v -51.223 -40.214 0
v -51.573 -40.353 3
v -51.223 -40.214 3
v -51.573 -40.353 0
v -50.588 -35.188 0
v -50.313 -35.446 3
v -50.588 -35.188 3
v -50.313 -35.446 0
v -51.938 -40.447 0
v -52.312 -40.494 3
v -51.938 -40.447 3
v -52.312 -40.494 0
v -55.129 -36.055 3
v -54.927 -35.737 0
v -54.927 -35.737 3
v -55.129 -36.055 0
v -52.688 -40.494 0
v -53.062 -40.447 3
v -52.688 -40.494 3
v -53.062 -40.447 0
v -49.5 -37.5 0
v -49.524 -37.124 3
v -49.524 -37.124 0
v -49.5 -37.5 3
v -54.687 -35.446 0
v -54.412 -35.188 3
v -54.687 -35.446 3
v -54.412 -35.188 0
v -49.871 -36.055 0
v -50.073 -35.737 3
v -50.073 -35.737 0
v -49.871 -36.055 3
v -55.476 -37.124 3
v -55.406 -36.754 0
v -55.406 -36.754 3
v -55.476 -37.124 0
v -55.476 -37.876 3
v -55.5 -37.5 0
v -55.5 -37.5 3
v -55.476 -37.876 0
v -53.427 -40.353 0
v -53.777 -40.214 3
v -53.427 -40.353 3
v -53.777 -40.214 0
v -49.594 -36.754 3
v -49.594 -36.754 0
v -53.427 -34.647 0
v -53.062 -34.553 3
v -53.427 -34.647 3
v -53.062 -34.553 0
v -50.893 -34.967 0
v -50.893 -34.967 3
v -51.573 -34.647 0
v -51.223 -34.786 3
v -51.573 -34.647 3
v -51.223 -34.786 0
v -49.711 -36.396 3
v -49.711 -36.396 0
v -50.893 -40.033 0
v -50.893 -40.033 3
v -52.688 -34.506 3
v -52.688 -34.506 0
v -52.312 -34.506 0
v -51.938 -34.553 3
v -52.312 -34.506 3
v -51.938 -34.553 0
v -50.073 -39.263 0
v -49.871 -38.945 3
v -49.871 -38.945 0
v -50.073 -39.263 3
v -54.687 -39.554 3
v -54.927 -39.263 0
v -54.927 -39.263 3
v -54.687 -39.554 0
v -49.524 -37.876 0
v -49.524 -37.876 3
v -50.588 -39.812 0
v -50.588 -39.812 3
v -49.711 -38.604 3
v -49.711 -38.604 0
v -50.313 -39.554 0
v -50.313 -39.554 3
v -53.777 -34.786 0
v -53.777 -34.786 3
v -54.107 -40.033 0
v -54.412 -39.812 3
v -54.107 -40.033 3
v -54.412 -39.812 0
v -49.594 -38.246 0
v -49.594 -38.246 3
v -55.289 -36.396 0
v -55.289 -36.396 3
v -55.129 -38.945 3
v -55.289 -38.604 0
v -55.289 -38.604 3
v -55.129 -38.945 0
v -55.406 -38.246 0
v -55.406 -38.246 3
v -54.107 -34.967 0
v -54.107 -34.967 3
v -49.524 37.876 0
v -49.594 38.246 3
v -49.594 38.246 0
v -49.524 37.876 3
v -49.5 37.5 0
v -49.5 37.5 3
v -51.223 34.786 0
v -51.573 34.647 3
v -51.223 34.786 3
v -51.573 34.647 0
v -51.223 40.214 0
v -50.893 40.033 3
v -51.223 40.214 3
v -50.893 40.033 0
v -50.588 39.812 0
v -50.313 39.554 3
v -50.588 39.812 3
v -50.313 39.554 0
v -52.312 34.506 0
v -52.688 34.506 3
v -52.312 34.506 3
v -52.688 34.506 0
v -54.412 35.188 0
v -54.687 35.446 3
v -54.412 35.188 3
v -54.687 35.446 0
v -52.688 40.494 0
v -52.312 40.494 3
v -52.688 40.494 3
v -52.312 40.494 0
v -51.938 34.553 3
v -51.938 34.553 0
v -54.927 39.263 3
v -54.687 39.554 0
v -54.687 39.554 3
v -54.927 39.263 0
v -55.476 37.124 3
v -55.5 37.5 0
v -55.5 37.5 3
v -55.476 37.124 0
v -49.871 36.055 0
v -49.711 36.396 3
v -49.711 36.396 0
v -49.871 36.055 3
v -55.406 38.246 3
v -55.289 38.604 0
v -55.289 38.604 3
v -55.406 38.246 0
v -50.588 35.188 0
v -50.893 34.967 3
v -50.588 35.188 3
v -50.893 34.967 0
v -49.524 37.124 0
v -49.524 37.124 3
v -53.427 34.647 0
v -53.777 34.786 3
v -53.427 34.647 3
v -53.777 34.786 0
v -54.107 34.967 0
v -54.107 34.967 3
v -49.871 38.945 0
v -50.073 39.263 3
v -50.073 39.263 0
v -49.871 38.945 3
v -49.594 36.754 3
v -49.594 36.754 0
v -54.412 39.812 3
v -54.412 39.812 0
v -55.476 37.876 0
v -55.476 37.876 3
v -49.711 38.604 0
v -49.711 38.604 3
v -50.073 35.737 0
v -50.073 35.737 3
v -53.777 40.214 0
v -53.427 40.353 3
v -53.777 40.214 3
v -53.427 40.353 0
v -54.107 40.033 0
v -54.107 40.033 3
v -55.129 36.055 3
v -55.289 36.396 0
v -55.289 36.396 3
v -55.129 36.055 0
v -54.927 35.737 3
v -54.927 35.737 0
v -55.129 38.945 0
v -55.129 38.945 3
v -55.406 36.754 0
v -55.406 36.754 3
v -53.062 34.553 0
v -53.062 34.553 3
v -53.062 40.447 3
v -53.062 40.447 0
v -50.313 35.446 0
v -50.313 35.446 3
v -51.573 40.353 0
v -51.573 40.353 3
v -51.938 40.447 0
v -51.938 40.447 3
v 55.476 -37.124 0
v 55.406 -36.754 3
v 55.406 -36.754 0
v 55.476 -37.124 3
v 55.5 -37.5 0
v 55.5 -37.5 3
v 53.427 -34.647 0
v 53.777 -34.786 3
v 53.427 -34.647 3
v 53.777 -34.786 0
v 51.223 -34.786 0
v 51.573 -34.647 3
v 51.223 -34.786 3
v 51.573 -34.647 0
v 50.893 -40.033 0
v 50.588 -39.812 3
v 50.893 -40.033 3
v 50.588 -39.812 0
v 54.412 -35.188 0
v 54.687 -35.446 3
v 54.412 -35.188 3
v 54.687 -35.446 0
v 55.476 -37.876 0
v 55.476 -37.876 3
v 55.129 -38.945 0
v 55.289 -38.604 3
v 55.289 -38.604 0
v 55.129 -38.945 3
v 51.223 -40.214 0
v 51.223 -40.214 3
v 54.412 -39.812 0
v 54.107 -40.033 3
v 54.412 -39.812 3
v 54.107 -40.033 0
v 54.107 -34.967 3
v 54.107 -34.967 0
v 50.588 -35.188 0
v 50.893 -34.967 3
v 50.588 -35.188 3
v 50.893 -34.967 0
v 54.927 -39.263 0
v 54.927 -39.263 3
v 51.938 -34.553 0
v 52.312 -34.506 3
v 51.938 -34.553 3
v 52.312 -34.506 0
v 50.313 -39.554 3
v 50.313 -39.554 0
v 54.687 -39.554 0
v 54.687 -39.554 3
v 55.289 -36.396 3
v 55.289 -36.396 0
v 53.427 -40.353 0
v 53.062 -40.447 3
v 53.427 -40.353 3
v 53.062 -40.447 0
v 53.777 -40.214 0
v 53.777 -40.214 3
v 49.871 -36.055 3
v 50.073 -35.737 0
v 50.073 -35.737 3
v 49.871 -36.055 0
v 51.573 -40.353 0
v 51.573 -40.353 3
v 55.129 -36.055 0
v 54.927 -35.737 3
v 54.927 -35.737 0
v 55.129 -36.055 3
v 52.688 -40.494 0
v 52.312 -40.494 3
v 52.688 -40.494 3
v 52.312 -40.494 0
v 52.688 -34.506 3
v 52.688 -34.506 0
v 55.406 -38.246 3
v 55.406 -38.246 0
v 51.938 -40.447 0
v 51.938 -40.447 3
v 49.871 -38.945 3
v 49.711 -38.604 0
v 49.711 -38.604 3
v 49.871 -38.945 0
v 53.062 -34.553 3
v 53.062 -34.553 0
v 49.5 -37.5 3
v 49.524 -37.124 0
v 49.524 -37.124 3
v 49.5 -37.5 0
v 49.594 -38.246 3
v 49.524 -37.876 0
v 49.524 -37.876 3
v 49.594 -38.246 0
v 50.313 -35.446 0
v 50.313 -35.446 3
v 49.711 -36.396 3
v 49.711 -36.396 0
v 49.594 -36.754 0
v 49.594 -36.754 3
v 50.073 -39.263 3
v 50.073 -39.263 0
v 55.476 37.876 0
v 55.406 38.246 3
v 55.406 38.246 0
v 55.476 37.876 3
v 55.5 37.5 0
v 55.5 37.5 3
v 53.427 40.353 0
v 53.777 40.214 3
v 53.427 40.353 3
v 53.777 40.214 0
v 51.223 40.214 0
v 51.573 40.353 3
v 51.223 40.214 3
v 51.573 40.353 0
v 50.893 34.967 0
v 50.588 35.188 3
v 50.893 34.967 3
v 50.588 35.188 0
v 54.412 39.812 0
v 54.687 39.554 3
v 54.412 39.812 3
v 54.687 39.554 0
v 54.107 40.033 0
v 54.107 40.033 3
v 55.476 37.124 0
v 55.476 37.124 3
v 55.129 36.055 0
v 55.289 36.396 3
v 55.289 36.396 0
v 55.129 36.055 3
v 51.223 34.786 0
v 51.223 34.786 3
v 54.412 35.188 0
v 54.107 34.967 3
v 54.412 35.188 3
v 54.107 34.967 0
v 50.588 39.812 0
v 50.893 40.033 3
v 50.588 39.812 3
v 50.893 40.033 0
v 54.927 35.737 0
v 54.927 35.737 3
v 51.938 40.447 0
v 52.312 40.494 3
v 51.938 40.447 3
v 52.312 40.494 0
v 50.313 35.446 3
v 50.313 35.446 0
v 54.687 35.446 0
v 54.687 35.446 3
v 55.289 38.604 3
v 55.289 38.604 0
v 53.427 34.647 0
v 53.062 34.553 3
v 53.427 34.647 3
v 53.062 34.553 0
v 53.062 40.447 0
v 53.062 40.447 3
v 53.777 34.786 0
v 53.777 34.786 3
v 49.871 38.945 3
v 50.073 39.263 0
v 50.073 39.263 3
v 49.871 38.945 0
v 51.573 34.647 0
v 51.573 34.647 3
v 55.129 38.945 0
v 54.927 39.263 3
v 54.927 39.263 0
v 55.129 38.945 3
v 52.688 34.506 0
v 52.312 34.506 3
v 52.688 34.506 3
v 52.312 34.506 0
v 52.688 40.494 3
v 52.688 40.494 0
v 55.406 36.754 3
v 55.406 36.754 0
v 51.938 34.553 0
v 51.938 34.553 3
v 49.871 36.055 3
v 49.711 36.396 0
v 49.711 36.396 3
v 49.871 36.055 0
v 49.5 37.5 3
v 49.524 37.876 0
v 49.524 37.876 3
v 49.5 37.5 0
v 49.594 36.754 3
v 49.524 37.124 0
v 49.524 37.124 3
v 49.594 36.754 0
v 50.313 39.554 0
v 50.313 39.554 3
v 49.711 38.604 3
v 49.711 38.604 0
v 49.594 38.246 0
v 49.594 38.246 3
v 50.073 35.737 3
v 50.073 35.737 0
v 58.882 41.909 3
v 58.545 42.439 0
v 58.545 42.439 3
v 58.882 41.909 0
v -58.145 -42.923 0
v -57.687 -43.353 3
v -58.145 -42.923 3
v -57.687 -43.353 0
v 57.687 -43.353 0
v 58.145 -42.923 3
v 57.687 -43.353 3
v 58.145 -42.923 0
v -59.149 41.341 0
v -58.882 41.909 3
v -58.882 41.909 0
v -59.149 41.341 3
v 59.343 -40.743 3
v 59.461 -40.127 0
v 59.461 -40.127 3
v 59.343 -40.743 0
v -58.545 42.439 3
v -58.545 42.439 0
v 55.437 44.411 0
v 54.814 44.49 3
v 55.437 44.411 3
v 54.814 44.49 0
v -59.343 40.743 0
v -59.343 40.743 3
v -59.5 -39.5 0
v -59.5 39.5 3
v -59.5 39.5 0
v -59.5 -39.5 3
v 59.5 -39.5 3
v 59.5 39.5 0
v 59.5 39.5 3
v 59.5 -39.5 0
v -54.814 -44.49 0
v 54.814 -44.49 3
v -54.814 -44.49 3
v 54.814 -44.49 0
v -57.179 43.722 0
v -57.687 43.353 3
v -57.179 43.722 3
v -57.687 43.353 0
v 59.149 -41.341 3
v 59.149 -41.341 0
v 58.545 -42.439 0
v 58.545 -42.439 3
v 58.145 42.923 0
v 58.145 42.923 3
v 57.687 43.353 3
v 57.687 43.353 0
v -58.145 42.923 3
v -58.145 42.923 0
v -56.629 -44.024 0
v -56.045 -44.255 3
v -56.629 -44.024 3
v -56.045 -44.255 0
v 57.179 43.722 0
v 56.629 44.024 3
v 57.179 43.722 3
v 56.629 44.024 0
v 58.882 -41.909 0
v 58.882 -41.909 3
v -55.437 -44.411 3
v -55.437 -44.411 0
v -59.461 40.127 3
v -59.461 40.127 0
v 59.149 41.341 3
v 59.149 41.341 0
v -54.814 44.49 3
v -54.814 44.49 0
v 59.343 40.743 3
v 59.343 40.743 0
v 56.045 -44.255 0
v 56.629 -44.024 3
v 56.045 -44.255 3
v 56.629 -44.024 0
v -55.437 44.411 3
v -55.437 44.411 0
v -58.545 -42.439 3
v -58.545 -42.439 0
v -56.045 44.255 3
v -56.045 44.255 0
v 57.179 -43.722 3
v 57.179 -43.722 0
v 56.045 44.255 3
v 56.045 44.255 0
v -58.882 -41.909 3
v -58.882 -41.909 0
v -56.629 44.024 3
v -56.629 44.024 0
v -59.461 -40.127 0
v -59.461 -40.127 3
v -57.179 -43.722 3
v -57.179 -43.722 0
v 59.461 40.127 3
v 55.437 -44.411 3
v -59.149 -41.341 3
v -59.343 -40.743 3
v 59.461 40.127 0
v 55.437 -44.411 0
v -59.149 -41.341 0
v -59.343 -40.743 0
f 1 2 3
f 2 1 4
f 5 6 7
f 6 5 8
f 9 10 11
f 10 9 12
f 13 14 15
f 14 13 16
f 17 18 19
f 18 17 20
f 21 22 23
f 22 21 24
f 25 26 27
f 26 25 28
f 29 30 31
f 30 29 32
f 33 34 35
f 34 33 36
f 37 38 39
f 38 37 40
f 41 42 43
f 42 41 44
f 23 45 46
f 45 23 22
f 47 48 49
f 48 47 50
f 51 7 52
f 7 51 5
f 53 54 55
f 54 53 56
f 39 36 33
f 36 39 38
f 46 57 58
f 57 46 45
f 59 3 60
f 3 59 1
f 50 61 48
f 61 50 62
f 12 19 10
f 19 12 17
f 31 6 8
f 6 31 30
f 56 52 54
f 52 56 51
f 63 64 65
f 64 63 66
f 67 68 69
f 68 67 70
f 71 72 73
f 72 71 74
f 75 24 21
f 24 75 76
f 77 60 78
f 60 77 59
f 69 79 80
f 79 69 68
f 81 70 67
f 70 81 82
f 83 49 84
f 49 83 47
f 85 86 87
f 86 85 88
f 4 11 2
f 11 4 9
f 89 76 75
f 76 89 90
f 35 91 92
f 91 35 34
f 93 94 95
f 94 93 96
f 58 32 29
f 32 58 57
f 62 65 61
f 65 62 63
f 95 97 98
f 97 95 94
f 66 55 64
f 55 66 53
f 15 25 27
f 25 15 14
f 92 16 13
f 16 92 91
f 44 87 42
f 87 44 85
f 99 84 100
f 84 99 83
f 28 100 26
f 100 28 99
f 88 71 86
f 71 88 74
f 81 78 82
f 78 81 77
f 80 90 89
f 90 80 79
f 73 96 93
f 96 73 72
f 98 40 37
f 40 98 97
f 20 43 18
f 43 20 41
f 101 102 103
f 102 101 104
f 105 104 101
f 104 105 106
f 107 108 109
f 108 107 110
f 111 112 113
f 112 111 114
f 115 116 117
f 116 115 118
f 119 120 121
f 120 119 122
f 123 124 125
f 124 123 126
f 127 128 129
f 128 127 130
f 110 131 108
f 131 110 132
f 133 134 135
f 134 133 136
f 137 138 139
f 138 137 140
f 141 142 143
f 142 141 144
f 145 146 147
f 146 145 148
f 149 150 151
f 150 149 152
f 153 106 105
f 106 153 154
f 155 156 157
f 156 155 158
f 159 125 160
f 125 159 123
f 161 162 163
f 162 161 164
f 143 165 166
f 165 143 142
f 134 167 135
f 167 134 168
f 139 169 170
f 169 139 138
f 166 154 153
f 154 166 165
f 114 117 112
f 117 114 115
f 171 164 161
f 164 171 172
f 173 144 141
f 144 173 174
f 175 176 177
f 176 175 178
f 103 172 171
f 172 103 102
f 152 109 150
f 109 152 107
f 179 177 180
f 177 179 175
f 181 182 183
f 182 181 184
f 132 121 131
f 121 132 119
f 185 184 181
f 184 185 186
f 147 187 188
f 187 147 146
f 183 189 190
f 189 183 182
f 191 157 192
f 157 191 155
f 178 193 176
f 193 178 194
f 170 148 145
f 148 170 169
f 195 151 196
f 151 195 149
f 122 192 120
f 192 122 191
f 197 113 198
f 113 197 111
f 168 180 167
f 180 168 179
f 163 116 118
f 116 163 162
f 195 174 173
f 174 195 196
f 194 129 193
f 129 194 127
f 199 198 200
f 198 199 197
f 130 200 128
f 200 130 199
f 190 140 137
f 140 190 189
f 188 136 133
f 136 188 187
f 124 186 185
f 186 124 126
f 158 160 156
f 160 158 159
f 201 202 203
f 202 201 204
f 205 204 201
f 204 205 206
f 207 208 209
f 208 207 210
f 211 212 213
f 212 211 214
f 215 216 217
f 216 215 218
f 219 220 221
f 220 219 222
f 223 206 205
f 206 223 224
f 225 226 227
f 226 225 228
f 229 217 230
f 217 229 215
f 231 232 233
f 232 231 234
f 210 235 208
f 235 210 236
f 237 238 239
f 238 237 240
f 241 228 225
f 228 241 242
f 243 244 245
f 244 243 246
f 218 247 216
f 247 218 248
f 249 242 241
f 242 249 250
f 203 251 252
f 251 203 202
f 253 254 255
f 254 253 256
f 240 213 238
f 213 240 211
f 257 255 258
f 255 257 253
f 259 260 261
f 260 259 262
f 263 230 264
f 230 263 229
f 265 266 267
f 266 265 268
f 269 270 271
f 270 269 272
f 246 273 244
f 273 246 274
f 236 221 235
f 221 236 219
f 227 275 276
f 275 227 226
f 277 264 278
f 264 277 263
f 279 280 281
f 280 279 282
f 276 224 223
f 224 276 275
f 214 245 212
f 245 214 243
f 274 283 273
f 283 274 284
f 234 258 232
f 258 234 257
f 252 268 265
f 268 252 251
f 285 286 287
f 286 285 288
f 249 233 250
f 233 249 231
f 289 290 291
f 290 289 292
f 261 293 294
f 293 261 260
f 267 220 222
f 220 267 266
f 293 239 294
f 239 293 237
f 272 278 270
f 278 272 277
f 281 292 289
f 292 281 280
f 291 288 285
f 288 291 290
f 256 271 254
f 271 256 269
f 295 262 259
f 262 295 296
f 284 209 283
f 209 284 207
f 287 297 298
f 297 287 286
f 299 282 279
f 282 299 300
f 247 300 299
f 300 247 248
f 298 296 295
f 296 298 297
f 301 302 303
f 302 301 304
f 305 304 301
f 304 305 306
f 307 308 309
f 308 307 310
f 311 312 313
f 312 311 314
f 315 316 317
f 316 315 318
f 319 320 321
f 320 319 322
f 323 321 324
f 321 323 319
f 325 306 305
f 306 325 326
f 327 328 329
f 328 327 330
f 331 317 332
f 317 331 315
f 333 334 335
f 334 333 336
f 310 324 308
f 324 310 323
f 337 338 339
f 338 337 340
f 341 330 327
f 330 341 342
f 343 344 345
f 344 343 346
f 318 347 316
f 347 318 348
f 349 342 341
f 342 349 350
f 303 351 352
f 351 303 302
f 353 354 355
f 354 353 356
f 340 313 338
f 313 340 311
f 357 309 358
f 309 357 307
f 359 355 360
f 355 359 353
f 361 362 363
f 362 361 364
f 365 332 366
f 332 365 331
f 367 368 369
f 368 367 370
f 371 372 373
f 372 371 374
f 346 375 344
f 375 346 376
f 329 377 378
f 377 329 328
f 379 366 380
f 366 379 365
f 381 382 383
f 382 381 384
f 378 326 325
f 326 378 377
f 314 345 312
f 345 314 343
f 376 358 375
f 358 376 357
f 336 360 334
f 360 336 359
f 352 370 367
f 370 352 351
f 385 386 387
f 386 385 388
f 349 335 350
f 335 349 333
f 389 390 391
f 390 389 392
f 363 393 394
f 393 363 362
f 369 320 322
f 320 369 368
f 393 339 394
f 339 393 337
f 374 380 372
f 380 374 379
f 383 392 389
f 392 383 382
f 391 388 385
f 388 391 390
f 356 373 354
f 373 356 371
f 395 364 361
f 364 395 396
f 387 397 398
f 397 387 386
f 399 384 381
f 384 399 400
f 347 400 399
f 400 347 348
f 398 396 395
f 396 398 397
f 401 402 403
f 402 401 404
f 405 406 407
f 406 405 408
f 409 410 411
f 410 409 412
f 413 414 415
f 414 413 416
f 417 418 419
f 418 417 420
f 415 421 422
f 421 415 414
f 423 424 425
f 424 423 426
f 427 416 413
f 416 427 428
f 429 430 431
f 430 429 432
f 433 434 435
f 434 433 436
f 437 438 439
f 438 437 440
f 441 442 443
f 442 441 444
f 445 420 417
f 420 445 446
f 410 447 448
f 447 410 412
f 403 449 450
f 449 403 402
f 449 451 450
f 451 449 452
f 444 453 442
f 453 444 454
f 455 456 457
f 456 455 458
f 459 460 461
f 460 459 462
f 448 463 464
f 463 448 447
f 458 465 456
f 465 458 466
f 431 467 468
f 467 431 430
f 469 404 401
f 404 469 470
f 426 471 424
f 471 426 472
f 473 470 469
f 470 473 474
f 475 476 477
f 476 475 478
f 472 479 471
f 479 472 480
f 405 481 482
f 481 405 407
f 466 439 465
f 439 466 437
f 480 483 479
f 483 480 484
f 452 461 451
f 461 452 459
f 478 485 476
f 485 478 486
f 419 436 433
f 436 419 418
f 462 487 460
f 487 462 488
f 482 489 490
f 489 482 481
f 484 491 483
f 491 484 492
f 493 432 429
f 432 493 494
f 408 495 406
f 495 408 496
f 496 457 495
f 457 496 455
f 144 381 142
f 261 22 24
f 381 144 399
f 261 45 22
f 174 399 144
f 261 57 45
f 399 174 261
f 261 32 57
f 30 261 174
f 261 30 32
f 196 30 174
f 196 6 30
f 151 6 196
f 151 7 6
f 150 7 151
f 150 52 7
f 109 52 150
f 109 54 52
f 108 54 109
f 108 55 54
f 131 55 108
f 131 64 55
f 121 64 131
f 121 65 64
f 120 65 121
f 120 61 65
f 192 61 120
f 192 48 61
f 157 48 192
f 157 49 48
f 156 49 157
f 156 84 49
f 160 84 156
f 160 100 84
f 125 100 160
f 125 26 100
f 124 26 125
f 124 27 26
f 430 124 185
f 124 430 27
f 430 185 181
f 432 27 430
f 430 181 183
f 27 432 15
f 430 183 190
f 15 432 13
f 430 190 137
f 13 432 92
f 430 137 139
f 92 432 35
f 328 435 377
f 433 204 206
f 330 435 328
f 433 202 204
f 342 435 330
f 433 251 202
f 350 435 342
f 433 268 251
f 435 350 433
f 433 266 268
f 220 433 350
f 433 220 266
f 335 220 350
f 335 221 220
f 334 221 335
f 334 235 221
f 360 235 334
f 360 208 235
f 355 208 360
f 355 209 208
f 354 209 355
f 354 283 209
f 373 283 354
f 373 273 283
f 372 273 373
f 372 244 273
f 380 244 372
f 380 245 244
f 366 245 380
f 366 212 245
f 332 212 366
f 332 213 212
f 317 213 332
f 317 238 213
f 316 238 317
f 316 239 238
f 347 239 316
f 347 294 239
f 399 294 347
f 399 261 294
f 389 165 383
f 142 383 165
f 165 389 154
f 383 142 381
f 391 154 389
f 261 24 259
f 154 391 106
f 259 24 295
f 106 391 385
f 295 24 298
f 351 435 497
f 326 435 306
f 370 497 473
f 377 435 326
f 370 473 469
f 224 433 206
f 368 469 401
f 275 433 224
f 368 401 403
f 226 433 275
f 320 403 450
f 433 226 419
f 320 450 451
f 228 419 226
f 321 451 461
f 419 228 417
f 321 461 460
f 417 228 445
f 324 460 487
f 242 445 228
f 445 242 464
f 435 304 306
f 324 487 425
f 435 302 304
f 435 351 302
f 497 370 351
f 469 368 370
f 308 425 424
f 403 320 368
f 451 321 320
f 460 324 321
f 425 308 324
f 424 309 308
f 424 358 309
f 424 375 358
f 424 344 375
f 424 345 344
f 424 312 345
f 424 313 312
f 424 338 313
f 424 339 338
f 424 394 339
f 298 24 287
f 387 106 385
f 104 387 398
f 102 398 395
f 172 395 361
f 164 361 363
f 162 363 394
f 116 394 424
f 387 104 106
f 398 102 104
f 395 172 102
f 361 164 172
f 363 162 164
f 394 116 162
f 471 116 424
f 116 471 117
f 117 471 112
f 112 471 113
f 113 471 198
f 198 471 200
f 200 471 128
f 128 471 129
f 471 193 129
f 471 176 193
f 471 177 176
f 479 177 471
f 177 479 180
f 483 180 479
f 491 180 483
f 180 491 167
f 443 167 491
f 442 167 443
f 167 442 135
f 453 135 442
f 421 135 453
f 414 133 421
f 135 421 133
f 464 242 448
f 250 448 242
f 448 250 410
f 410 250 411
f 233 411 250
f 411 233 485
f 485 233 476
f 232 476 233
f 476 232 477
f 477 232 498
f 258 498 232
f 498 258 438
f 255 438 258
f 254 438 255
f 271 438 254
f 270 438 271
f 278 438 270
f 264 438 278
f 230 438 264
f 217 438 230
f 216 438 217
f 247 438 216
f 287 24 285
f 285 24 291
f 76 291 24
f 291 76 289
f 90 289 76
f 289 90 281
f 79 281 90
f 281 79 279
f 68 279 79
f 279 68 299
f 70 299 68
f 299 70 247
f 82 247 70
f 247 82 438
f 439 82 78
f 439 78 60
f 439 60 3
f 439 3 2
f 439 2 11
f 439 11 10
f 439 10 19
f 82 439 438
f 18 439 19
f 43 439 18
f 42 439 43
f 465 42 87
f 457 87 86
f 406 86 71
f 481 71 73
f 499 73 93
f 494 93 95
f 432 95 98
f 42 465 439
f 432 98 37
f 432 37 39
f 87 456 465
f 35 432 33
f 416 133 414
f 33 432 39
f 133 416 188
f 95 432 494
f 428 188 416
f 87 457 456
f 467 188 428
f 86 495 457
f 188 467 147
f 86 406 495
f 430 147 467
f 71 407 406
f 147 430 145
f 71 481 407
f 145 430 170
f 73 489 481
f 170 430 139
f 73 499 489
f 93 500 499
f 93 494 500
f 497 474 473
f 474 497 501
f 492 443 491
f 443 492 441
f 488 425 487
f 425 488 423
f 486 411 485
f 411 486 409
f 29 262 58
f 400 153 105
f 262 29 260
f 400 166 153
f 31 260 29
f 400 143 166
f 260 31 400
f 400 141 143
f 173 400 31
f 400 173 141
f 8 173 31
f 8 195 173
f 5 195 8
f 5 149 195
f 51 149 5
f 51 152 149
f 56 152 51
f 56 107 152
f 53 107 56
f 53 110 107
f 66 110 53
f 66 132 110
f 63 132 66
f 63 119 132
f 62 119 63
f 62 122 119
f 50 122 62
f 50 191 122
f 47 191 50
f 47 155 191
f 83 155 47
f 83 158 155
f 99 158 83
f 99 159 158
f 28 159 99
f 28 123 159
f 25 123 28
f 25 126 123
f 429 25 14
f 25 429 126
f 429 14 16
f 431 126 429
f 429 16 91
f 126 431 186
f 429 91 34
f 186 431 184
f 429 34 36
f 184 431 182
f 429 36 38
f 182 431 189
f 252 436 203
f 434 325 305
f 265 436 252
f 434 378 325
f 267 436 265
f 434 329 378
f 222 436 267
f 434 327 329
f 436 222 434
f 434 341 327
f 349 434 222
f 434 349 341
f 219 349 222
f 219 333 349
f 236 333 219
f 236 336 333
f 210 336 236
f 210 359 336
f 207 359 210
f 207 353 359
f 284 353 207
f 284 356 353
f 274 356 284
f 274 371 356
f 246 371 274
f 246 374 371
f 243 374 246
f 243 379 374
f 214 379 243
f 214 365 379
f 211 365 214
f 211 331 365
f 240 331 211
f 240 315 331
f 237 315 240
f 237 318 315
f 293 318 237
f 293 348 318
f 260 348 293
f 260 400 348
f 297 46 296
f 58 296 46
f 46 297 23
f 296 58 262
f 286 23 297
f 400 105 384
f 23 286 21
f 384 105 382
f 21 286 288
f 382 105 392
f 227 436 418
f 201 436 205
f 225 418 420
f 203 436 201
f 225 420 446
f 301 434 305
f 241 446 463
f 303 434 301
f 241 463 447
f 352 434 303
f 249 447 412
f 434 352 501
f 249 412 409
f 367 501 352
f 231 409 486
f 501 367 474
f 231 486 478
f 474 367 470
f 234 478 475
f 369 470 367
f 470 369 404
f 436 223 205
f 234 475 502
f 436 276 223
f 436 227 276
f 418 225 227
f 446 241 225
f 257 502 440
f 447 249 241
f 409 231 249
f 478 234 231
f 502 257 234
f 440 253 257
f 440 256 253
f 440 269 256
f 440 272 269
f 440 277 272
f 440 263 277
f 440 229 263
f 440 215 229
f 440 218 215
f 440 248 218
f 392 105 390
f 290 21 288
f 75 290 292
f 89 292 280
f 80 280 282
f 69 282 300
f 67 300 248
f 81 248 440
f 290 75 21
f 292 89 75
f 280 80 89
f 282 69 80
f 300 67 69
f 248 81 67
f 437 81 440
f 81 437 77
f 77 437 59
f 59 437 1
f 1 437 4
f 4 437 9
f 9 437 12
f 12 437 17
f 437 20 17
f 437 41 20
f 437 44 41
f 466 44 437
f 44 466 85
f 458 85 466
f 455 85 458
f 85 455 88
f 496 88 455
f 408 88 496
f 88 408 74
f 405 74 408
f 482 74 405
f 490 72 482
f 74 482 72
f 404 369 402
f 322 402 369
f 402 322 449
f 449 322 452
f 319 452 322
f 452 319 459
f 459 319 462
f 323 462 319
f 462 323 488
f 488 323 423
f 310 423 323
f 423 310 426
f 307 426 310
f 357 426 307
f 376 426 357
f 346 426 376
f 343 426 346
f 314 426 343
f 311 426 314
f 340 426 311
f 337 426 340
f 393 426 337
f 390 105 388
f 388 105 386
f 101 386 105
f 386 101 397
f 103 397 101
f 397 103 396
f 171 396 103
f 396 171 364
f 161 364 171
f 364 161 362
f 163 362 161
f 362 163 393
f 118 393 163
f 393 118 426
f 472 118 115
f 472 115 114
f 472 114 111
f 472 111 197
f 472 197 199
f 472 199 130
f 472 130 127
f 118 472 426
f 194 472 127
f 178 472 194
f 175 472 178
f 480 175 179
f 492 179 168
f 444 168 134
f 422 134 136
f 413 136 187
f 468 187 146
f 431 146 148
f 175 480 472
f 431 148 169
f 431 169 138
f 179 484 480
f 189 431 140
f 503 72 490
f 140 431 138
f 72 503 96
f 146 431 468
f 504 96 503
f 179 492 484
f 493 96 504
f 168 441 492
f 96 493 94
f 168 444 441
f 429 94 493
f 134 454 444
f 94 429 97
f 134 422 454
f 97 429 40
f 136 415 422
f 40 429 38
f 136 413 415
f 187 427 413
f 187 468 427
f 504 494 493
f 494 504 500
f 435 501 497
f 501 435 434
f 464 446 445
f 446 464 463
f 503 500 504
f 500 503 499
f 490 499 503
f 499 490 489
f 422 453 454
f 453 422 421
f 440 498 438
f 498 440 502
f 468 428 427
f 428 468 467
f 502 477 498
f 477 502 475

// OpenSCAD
$fn = 50;


difference() {
	union() {
		hull() {
			translate(v = [-54.5000000000, 39.5000000000, 0]) {
				cylinder(h = 3, r = 5);
			}
			translate(v = [54.5000000000, 39.5000000000, 0]) {
				cylinder(h = 3, r = 5);
			}
			translate(v = [-54.5000000000, -39.5000000000, 0]) {
				cylinder(h = 3, r = 5);
			}
			translate(v = [54.5000000000, -39.5000000000, 0]) {
				cylinder(h = 3, r = 5);
			}
		}
	}
	union() {
		translate(v = [-52.5000000000, -37.5000000000, -100.0000000000]) {
			cylinder(h = 200, r = 3.0000000000);
		}
		translate(v = [-52.5000000000, 37.5000000000, -100.0000000000]) {
			cylinder(h = 200, r = 3.0000000000);
		}
		translate(v = [52.5000000000, -37.5000000000, -100.0000000000]) {
			cylinder(h = 200, r = 3.0000000000);
		}
		translate(v = [52.5000000000, 37.5000000000, -100.0000000000]) {
			cylinder(h = 200, r = 3.0000000000);
		}
	}
}
